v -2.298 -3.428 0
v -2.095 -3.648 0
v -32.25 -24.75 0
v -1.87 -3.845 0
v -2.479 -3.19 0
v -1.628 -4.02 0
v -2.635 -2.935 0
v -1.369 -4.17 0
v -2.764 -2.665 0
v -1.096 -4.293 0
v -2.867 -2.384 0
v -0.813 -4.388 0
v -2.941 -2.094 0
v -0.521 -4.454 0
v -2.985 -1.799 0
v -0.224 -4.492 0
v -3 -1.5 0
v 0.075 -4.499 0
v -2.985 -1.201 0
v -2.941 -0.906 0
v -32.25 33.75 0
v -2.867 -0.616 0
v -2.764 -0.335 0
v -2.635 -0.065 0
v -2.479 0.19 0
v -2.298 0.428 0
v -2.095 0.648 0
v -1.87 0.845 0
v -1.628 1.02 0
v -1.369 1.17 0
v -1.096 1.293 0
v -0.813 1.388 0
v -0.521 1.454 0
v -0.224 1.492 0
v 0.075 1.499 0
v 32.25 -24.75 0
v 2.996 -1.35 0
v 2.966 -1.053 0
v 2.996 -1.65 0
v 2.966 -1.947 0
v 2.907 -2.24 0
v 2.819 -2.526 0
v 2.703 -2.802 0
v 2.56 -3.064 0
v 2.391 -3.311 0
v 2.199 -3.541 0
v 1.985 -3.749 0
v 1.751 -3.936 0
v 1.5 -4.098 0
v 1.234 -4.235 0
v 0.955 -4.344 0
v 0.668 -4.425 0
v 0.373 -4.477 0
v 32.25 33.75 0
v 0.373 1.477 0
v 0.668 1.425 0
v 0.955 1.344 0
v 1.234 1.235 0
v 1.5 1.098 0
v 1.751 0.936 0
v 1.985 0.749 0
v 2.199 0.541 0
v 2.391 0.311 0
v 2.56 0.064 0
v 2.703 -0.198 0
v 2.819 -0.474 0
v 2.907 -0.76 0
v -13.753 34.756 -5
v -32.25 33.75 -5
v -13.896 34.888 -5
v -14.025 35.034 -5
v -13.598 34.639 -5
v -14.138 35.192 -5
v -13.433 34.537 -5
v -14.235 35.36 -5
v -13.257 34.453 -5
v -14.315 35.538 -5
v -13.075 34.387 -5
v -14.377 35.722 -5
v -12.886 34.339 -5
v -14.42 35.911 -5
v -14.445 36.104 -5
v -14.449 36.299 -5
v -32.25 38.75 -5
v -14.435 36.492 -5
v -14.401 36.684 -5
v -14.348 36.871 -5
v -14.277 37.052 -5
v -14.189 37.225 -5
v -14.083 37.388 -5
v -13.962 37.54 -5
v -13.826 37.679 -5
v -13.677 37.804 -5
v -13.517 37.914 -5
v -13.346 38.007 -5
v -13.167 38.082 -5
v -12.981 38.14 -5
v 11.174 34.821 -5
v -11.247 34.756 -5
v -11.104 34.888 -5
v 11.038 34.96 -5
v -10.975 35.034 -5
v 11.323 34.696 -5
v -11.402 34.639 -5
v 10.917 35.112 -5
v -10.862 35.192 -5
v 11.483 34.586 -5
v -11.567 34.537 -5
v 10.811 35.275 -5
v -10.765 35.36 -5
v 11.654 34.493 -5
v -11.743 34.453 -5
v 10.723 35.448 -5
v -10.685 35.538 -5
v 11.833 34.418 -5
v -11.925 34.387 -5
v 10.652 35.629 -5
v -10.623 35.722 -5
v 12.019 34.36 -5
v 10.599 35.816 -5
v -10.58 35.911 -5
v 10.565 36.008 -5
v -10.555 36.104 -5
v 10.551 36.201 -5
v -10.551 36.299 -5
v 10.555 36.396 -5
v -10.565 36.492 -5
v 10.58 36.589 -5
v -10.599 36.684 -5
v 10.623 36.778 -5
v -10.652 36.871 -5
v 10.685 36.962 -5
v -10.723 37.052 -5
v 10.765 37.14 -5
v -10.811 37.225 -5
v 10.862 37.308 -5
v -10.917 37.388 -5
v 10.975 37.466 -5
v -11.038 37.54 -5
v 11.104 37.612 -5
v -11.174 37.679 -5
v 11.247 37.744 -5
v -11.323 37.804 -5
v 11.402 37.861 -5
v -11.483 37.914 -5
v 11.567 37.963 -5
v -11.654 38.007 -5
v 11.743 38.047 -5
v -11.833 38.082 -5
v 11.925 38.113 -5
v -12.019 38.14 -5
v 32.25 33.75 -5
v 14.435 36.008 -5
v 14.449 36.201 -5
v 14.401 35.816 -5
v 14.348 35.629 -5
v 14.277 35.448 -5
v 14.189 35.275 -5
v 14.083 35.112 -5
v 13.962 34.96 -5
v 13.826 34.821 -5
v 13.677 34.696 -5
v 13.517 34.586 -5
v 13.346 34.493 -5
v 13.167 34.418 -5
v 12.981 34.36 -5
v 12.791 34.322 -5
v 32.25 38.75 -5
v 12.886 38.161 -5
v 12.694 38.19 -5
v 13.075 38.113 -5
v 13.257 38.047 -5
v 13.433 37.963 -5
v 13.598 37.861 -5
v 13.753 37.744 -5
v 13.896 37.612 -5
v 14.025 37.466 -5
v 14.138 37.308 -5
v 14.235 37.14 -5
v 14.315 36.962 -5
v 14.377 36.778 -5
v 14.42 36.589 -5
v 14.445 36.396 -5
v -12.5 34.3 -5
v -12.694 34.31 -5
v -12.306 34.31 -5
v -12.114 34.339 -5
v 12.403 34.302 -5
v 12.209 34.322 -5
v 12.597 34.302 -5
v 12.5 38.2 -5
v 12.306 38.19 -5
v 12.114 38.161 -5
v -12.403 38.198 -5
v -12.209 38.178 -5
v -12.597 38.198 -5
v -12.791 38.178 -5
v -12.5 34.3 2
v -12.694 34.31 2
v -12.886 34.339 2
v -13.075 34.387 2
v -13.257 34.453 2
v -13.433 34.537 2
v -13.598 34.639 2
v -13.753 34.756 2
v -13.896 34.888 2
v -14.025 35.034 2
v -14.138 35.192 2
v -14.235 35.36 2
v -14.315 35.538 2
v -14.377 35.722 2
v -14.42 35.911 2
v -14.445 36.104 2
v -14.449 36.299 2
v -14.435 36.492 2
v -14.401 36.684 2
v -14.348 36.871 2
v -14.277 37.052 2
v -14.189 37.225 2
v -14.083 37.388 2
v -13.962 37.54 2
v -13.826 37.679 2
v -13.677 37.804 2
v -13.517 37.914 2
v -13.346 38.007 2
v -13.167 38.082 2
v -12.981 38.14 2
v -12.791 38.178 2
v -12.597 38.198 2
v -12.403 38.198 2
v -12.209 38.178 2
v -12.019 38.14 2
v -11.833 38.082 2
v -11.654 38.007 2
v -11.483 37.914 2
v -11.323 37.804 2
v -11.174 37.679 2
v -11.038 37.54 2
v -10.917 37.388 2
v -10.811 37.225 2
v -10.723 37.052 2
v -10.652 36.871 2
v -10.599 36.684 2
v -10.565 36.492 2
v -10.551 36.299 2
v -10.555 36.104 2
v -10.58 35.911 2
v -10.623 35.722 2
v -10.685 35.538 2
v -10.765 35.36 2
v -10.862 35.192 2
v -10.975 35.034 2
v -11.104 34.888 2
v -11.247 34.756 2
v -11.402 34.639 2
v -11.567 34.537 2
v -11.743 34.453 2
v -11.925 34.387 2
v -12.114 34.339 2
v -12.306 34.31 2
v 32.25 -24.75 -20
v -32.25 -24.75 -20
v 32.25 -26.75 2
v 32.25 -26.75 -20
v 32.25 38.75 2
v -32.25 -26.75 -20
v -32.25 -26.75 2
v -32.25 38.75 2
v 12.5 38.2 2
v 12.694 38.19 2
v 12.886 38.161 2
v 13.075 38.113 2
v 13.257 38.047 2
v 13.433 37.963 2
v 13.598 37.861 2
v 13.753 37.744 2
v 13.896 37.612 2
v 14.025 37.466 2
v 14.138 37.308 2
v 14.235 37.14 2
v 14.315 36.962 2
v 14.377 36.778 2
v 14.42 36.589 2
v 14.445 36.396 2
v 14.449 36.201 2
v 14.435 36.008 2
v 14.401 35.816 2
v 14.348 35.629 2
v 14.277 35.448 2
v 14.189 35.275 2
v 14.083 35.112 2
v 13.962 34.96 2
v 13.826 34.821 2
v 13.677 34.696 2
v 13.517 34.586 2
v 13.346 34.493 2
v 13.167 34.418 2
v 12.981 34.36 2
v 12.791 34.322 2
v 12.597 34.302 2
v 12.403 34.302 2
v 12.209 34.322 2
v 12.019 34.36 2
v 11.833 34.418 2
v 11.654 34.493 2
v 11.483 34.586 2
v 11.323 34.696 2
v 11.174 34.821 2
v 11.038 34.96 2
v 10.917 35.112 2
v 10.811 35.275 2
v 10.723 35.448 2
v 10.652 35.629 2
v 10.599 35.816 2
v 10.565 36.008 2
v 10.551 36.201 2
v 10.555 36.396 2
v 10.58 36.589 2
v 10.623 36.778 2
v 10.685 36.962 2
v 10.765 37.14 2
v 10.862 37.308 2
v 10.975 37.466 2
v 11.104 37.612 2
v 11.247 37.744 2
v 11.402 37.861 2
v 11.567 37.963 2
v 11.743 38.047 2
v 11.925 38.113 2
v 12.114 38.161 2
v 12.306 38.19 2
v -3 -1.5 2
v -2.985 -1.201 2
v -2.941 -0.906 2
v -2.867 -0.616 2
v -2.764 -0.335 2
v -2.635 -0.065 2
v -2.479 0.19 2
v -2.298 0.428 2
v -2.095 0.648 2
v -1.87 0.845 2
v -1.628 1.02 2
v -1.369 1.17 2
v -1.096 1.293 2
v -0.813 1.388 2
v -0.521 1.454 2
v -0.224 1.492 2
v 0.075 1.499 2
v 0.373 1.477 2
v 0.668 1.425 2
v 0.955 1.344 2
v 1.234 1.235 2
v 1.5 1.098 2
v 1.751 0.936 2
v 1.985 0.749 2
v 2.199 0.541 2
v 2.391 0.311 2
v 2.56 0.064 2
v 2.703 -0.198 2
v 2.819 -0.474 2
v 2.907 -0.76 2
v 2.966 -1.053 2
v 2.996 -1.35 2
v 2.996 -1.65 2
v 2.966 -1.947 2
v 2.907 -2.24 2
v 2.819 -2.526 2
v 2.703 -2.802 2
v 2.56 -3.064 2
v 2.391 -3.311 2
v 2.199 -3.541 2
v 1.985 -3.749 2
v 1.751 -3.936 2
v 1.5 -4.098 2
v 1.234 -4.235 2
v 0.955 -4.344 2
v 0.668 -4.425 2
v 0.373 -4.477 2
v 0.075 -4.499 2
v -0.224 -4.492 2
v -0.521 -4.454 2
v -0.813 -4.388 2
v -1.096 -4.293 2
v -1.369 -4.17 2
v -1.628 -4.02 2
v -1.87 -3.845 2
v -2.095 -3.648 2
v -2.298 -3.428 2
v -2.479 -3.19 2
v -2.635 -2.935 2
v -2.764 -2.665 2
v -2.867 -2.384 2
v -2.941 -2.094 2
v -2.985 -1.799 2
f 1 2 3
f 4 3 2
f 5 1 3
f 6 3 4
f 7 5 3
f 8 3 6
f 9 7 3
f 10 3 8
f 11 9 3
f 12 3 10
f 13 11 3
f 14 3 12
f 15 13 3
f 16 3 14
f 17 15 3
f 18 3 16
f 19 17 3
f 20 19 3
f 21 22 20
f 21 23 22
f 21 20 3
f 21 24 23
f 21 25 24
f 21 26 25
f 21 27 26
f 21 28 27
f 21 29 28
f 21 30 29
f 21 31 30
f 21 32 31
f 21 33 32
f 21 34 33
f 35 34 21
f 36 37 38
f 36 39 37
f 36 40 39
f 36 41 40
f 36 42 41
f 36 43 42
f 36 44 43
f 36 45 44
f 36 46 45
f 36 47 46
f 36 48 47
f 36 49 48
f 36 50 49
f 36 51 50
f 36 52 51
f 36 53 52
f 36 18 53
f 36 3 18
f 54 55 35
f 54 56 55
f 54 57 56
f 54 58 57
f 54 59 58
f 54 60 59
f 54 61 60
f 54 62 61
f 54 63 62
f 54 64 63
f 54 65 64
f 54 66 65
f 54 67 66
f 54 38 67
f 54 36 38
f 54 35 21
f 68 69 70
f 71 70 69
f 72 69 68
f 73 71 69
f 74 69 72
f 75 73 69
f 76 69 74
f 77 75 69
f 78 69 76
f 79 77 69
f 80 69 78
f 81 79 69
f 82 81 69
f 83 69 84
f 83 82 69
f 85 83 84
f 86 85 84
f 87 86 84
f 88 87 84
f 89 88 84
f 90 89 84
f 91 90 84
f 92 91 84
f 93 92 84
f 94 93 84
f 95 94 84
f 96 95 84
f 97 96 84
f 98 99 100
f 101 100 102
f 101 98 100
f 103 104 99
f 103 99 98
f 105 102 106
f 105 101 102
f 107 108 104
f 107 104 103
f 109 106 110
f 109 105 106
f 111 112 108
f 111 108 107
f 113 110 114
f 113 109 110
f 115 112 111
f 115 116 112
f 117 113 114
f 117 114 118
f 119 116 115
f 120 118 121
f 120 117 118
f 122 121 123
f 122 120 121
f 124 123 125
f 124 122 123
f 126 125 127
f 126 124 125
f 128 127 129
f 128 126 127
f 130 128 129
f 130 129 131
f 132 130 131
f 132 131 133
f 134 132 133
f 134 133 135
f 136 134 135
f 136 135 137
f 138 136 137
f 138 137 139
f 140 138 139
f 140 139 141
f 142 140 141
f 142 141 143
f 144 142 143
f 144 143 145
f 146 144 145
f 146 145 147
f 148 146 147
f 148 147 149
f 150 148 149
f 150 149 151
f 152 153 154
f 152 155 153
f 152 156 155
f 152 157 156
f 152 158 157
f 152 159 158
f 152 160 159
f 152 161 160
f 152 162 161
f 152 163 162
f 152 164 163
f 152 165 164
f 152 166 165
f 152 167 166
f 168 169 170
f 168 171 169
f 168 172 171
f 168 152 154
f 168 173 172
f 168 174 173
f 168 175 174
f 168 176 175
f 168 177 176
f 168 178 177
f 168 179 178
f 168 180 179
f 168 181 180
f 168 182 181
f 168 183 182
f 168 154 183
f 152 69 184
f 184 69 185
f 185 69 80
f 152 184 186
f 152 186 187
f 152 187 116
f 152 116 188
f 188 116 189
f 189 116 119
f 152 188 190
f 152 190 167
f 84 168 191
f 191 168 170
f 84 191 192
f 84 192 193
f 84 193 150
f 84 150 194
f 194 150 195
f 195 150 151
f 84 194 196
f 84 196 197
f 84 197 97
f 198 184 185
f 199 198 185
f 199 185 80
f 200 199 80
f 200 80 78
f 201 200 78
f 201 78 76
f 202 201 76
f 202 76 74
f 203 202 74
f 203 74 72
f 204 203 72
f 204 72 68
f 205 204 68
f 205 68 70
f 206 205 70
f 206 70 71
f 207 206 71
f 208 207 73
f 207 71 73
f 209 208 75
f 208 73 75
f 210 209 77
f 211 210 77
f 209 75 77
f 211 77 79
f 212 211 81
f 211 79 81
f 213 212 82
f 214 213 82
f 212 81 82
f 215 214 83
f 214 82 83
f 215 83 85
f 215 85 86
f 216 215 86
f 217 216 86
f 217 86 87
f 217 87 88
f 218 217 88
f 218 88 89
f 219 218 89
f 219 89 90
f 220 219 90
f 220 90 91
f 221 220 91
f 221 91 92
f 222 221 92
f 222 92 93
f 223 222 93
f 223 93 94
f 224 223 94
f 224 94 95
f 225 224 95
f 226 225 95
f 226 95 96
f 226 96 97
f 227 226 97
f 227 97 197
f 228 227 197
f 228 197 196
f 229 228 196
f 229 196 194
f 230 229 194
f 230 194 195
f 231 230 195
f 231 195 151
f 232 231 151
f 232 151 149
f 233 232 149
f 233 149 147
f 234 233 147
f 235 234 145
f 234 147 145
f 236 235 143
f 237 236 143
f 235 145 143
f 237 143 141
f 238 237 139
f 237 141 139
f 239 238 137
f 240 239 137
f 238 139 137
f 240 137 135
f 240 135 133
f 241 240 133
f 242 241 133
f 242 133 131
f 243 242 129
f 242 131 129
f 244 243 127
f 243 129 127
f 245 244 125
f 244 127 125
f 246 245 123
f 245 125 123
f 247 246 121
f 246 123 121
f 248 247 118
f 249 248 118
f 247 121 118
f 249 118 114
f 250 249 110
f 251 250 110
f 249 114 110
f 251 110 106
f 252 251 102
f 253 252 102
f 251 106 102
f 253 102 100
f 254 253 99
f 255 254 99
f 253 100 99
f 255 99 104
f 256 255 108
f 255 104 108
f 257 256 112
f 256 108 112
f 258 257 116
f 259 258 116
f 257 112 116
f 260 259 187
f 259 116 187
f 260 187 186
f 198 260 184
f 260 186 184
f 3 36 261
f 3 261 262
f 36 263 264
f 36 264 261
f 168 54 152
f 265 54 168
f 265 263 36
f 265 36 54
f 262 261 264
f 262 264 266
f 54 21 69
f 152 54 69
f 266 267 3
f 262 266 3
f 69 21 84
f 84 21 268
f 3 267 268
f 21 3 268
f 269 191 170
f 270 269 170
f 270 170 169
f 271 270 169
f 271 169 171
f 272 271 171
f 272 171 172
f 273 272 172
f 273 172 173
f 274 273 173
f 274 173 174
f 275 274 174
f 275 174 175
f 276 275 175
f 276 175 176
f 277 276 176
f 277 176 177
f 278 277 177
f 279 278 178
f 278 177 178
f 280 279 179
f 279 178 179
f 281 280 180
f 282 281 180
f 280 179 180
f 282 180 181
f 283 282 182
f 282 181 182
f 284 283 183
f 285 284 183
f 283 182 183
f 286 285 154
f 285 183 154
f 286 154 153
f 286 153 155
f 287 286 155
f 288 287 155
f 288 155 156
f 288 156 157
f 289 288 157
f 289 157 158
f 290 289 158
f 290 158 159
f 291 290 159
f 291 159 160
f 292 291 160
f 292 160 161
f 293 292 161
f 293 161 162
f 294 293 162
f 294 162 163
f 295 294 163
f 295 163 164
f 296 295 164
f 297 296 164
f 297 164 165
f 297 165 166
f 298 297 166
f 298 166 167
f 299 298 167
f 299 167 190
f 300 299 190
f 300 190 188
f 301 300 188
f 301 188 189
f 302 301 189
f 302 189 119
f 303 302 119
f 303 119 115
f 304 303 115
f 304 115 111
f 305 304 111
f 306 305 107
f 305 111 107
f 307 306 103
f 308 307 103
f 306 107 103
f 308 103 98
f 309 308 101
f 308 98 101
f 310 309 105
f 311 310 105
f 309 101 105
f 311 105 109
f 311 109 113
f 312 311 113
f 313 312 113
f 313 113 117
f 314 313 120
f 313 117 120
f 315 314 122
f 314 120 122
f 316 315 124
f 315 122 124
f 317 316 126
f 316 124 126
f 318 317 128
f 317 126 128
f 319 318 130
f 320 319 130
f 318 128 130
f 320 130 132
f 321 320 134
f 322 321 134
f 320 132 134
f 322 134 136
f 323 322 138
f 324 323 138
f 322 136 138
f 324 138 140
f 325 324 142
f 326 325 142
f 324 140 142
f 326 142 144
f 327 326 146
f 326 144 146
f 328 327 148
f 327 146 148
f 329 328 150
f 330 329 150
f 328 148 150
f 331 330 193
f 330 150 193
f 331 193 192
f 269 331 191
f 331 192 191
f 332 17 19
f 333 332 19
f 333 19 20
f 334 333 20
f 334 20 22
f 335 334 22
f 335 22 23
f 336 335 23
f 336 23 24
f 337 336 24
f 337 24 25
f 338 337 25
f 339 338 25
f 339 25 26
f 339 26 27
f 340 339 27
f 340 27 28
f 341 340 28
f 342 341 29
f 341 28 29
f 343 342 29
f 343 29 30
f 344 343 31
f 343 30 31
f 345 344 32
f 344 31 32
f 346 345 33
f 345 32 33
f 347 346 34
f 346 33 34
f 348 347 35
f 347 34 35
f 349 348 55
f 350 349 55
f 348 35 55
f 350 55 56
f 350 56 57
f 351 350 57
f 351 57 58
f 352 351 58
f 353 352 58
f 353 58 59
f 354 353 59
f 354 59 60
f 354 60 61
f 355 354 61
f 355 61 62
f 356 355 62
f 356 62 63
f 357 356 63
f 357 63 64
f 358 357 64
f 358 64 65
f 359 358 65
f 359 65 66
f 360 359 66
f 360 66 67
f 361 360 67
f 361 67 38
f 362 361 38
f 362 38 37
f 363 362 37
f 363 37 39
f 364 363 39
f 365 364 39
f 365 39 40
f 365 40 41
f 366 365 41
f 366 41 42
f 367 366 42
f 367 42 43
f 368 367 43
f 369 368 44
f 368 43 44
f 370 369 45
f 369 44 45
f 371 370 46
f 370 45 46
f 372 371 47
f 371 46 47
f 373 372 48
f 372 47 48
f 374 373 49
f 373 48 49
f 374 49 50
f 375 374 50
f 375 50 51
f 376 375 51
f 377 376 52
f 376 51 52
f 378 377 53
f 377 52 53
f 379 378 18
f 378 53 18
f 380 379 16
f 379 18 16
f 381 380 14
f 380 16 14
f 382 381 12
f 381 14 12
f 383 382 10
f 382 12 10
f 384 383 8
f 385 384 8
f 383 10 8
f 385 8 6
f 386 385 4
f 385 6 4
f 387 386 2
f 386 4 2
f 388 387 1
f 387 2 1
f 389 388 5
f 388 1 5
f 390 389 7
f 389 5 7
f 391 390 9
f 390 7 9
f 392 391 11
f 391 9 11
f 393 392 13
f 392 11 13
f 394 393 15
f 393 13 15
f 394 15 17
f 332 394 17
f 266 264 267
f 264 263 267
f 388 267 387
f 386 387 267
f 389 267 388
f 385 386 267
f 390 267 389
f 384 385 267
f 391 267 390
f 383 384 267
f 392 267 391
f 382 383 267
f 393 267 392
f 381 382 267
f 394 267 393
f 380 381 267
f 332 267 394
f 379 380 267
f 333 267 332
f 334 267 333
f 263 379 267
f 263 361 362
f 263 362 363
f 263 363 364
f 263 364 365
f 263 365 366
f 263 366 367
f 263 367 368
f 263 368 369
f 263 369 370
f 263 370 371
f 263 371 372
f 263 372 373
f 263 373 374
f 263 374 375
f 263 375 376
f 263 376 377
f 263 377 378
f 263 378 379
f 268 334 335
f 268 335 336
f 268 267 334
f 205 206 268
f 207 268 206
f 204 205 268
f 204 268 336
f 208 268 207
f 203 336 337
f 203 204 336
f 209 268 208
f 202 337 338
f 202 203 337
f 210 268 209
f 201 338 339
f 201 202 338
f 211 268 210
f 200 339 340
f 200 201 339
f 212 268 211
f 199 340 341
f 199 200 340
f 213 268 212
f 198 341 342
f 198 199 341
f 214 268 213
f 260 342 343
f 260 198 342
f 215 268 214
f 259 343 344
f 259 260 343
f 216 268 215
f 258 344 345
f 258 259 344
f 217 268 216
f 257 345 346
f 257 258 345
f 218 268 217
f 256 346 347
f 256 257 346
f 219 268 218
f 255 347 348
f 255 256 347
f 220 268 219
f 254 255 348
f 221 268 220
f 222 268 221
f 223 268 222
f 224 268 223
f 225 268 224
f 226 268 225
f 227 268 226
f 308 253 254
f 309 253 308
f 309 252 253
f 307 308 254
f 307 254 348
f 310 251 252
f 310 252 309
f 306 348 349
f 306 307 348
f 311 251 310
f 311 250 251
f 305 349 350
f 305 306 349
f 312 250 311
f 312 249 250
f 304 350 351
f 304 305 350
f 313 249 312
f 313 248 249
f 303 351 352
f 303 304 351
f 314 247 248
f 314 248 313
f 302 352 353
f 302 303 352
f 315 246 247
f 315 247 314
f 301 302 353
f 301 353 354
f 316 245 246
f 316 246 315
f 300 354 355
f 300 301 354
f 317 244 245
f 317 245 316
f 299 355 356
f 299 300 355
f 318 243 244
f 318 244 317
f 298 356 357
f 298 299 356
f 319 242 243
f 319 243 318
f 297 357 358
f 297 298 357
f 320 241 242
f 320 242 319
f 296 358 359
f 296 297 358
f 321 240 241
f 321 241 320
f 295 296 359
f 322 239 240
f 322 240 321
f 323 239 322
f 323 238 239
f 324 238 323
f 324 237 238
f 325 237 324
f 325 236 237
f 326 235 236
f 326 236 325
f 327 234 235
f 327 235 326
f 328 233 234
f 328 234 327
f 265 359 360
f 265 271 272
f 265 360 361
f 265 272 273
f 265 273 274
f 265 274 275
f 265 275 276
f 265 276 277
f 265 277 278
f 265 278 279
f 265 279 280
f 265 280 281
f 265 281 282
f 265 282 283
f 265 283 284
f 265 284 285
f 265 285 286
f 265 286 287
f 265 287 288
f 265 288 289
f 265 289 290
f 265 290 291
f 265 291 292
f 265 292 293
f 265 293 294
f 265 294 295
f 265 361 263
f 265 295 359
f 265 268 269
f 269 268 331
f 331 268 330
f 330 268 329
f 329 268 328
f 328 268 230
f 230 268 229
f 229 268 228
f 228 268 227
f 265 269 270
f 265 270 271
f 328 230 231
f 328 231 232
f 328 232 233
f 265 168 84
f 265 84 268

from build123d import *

# Parameters (mm, degrees)
CROQUIS1_W              = 64.5
CROQUIS1_H              = 53.5
SALIENTE_EXTRUIR1_DEPTH = 2
CROQUIS2_W              = 64.5
CROQUIS2_H              = 5
SALIENTE_EXTRUIR2_DEPTH = 5
CROQUIS3_W              = 64.5
CROQUIS3_H              = 2
SALIENTE_EXTRUIR3_DEPTH = 20
CROQUIS5_R              = 3
CORTAR_EXTRUIR1_DEPTH   = 20
CROQUIS7_W              = 5
CROQUIS7_H              = 5.397784026
CORTAR_EXTRUIR3_DEPTH   = 73.634788497
CROQUIS8_W              = 2
CROQUIS8_H              = 10
CROQUIS8_H_2            = 5
CROQUIS8_W_2            = 5
SALIENTE_EXTRUIR4_DEPTH = 64.5
CROQUIS9_R              = 1.95
CORTAR_EXTRUIR4_DEPTH   = 53.598716714


with BuildPart() as part:
    # Croquis1 → Saliente-Extruir1 (new body)
    with BuildSketch(Plane.XY):
        Rectangle(CROQUIS1_W, CROQUIS1_H)
    extrude(amount=SALIENTE_EXTRUIR1_DEPTH)

    # Croquis2 → Saliente-Extruir2 (add)
    with BuildSketch(Plane(origin=(0, 0, 0), x_dir=(-1, 0, 0), z_dir=(0, 0, -1))):
        with Locations((0, 24.25)):
            Rectangle(CROQUIS2_W, CROQUIS2_H)
    extrude(amount=SALIENTE_EXTRUIR2_DEPTH)

    # Croquis3 → Saliente-Extruir3 (add)
    with BuildSketch(Plane(origin=(0, 0, 0), x_dir=(-1, 0, 0), z_dir=(0, 0, -1))):
        with Locations((0, -25.75)):
            Rectangle(CROQUIS3_W, CROQUIS3_H)
    extrude(amount=SALIENTE_EXTRUIR3_DEPTH)

    # Croquis5 → Cortar-Extruir1 (cut)
    with BuildSketch(Plane(origin=(0, 0, 0), x_dir=(-1, 0, 0), z_dir=(0, 0, -1))):
        with Locations((0, -1.5)):
            Circle(CROQUIS5_R)
    extrude(amount=-CORTAR_EXTRUIR1_DEPTH, mode=Mode.SUBTRACT)

    # Croquis7 → Cortar-Extruir3 (cut, through all)
    with BuildSketch(Plane(origin=(32.25, 0, 0), x_dir=(0, 0, -1), z_dir=(1, 0, 0))):
        with Locations((2.5, 24.051107987)):
            Rectangle(CROQUIS7_W, CROQUIS7_H)
    extrude(amount=-CORTAR_EXTRUIR3_DEPTH, mode=Mode.SUBTRACT)

    # Croquis8 → Saliente-Extruir4 (add, through all)
    with BuildSketch(Plane(origin=(32.25, 0, 0), x_dir=(0, 0, -1), z_dir=(1, 0, 0))):
        with Locations((-1, 28.75)):
            Rectangle(CROQUIS8_W, CROQUIS8_H)
        with Locations((-1, 36.25)):
            Rectangle(CROQUIS8_W, CROQUIS8_H_2)
        with Locations((2.5, 36.25)):
            Rectangle(CROQUIS8_W_2, CROQUIS8_H_2)
    extrude(amount=-SALIENTE_EXTRUIR4_DEPTH)

    # Croquis9 → Cortar-Extruir4 (cut, through all)
    with BuildSketch(Plane(origin=(0, 0, -5), x_dir=(-1, 0, 0), z_dir=(0, 0, -1))):
        with Locations(Location((-12.5, 36.25, 0), (0, 0, 90))):
            Circle(CROQUIS9_R)
        with Locations(Location((12.5, 36.25, 0), (0, 0, 270))):
            Circle(CROQUIS9_R)
    extrude(amount=-CORTAR_EXTRUIR4_DEPTH, mode=Mode.SUBTRACT)


solid = part.part
